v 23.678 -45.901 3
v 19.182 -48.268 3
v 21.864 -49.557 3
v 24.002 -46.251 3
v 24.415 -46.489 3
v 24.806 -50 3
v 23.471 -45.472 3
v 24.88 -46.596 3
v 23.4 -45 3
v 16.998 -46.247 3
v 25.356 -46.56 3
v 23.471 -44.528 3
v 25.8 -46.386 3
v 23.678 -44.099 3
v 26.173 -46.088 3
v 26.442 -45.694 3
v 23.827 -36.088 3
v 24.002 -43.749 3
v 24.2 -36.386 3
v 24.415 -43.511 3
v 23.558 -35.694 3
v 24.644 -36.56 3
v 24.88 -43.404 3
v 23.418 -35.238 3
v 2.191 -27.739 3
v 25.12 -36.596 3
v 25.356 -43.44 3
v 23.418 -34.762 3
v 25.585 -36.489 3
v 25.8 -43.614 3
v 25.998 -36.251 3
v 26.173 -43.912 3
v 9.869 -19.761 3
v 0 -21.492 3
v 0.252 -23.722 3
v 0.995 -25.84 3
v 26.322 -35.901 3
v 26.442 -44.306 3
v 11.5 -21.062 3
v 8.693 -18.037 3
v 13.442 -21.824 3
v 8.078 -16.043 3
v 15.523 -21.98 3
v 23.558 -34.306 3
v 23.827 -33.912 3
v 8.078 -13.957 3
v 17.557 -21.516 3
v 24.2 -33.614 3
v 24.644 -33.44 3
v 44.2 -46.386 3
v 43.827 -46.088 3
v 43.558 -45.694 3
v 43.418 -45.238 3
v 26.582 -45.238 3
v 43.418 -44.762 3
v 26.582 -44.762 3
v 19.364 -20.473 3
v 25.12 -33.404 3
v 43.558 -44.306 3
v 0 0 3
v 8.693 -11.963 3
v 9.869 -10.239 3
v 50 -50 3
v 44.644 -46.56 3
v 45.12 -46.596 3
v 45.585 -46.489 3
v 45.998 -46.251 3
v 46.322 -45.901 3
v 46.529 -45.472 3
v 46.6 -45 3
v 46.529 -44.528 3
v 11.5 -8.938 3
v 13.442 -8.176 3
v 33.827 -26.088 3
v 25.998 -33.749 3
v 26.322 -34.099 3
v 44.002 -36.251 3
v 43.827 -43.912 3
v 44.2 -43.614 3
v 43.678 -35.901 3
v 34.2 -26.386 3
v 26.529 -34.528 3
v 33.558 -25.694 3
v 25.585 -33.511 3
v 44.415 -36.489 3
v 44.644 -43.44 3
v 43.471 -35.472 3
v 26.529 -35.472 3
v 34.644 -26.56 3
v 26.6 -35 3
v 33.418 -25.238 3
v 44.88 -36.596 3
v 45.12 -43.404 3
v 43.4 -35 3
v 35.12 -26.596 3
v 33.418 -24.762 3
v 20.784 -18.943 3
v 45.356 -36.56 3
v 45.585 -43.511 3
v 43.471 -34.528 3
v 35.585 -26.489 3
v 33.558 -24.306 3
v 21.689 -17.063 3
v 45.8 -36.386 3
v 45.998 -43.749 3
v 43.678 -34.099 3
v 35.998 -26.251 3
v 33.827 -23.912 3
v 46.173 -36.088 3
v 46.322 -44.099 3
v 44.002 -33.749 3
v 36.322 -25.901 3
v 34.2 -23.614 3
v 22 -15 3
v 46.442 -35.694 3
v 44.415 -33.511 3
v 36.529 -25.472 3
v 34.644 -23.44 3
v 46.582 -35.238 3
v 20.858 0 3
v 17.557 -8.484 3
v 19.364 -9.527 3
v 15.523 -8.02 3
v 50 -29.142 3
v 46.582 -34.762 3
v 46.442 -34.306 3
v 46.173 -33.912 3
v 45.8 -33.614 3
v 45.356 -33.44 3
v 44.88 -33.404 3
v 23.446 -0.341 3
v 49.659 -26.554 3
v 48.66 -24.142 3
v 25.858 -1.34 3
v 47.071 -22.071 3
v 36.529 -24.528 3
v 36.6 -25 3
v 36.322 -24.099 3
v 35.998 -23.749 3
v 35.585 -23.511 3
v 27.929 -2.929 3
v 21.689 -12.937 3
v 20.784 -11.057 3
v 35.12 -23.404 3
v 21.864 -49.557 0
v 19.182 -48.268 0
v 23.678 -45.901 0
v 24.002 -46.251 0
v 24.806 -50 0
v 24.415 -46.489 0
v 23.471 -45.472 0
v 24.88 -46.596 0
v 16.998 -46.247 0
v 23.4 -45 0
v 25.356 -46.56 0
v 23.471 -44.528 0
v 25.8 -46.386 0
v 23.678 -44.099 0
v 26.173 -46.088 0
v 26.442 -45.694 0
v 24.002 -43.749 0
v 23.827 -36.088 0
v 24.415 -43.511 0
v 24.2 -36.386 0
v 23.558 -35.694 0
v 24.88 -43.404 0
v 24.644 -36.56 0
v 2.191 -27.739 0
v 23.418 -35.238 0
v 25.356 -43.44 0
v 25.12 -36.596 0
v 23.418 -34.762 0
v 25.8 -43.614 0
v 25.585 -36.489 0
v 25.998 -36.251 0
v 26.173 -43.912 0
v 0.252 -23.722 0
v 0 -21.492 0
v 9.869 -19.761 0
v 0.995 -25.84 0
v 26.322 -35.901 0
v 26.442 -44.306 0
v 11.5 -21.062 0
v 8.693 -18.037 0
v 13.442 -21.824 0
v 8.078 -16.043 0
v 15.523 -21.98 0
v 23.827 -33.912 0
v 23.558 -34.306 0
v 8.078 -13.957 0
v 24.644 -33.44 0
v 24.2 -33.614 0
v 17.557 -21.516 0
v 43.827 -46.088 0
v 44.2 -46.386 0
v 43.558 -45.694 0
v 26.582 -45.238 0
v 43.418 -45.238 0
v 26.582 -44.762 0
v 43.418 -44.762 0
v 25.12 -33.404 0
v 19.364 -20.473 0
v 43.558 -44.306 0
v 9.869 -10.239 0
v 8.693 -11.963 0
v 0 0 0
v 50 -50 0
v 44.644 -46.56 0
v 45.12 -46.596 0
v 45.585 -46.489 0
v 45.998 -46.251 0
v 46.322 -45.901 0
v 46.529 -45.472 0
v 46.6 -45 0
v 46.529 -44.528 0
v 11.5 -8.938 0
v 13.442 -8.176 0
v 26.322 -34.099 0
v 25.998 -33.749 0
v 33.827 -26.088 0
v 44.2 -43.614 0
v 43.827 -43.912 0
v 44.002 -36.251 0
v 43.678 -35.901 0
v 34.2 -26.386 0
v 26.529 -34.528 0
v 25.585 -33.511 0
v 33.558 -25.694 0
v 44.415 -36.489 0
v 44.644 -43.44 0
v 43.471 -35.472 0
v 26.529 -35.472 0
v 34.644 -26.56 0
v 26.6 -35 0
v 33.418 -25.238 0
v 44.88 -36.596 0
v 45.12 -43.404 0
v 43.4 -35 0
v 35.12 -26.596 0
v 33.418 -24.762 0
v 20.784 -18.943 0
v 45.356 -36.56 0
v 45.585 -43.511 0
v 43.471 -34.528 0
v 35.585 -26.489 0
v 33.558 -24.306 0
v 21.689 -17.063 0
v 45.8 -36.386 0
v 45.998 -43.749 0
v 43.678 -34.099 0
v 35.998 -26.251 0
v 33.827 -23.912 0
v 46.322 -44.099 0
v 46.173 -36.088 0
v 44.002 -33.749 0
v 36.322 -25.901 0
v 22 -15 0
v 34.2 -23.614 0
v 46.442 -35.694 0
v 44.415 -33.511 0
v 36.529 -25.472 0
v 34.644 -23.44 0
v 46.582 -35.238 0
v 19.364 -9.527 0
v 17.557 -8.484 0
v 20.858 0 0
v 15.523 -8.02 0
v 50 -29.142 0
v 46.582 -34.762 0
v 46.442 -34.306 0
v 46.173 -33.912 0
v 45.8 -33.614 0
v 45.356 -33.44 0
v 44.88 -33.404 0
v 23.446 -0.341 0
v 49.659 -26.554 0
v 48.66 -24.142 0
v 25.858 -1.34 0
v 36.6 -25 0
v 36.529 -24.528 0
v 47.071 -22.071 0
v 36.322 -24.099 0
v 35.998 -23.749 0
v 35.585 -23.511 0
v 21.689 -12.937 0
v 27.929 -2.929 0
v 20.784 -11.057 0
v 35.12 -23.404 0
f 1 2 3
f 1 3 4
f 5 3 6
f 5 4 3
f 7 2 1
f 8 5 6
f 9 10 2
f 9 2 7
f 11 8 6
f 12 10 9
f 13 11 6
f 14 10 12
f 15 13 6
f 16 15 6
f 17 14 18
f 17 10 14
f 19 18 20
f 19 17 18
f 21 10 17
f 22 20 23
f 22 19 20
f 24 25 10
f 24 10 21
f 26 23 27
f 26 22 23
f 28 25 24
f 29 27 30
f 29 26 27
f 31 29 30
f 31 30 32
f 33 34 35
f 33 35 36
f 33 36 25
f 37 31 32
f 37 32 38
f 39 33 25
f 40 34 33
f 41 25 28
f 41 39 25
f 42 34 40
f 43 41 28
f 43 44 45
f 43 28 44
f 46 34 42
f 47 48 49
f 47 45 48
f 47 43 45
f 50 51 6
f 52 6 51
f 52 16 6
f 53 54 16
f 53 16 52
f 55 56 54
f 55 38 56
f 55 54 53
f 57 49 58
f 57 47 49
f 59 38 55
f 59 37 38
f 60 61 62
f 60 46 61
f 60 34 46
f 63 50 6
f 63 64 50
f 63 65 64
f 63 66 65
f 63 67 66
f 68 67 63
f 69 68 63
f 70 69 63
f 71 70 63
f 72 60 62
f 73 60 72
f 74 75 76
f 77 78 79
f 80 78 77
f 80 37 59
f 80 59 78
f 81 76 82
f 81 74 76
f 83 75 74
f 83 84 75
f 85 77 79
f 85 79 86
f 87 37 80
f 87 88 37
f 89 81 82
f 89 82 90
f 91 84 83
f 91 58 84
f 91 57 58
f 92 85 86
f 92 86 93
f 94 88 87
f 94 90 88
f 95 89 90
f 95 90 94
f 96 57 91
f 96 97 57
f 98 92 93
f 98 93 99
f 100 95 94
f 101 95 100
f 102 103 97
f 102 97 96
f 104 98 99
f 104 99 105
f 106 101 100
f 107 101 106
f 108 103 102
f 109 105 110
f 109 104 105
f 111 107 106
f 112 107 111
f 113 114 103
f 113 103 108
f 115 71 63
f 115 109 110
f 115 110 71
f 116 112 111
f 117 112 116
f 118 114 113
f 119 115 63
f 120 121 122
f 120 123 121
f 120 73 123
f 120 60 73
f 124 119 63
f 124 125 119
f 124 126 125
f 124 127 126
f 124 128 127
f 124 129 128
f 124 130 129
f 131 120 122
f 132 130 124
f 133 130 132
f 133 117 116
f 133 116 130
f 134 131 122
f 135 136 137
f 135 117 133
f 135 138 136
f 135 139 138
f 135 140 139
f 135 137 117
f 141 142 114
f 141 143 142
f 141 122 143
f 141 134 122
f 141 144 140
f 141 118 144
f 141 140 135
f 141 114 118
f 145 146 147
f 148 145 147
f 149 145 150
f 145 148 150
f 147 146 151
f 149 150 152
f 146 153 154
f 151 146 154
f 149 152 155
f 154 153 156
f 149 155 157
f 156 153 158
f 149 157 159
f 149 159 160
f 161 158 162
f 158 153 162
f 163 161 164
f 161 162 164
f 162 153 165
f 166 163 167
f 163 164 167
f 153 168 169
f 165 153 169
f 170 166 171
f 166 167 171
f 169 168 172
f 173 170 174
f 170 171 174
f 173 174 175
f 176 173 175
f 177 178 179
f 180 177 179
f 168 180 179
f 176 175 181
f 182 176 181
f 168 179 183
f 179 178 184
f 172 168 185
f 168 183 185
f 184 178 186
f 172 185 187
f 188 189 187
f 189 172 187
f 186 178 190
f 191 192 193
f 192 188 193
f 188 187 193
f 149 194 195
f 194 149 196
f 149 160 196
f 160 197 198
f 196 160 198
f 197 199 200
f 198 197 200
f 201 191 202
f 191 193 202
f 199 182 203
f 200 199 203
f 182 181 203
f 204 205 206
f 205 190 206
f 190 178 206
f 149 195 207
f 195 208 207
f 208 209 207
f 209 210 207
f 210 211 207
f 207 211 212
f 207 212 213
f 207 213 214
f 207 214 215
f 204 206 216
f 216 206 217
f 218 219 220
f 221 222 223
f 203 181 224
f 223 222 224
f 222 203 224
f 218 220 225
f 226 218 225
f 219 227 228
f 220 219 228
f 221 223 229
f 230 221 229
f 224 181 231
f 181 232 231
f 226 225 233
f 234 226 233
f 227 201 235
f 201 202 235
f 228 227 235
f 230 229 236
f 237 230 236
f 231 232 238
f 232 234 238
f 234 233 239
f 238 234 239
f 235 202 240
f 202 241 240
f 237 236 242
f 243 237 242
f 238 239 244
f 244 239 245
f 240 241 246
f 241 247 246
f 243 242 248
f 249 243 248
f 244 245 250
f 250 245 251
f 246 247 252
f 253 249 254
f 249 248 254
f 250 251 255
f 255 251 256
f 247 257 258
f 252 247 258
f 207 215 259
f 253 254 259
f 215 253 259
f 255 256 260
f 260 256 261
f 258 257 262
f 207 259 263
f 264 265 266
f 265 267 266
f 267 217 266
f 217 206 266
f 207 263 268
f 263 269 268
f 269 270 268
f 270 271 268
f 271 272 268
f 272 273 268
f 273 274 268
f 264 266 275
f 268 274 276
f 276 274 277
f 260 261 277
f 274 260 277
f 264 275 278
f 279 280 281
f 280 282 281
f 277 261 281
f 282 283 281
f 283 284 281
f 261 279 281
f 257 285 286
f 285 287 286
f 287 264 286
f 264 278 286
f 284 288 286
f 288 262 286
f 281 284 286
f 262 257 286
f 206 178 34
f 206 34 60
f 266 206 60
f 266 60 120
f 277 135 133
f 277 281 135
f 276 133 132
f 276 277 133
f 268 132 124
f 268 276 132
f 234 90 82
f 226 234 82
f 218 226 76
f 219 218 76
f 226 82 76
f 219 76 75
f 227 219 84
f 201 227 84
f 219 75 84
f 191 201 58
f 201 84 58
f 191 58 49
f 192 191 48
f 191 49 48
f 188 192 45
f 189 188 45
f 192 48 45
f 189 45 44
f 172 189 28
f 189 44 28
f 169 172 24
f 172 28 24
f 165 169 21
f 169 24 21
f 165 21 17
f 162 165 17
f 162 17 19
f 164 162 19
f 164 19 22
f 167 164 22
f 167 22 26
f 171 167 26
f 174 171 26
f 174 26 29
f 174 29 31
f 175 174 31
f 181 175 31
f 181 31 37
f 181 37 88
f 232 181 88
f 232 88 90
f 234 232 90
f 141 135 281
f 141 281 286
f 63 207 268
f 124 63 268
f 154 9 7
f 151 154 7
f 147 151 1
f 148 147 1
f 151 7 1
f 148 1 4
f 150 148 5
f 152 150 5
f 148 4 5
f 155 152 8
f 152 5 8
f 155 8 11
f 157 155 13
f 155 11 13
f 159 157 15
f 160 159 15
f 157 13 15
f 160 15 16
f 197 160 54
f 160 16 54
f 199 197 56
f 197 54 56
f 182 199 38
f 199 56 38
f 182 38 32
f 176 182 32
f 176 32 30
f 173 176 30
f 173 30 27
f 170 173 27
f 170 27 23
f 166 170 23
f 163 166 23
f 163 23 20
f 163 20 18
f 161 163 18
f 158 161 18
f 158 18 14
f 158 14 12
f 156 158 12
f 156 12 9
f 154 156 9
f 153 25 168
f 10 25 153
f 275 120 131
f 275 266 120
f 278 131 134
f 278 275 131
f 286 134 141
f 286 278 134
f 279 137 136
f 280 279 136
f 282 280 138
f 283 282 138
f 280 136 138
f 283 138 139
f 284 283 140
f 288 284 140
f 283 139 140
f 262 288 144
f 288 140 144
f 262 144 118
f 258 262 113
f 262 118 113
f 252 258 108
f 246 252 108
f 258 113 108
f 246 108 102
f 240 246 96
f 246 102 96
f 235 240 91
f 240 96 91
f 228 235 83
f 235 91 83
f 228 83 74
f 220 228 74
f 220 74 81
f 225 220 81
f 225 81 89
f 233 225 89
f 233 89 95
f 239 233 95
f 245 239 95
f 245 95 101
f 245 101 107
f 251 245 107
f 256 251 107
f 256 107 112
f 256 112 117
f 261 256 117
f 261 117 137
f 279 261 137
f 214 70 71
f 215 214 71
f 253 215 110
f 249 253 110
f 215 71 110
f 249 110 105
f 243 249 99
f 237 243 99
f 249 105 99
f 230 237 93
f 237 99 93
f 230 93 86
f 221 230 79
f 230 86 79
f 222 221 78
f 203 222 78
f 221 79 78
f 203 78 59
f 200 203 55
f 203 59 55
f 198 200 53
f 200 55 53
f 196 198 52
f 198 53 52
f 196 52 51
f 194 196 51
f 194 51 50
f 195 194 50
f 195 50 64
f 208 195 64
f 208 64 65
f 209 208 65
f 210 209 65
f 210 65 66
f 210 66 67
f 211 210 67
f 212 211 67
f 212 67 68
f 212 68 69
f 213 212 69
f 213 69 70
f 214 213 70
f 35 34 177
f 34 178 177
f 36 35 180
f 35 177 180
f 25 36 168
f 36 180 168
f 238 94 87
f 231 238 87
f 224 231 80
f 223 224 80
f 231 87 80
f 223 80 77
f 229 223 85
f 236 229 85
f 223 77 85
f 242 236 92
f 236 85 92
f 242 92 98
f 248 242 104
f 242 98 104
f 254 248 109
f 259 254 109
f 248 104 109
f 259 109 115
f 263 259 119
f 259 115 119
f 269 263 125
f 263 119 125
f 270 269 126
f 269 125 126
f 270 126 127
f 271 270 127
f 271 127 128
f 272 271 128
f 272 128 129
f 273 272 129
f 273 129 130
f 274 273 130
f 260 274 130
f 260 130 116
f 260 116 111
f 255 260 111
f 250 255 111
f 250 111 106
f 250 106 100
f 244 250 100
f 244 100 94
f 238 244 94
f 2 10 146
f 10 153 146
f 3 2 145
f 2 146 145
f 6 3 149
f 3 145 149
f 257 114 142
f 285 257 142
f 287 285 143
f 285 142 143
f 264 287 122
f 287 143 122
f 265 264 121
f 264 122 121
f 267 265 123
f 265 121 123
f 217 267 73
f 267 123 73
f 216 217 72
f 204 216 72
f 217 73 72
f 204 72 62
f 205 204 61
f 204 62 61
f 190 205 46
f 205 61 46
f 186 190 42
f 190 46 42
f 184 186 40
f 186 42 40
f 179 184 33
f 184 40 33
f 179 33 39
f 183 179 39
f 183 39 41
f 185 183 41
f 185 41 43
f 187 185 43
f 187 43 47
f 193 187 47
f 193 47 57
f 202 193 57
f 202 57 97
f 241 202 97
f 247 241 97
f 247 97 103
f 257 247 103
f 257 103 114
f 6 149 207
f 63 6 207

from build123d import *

# Parameters (mm, degrees)
SKETCH_1_W          = 50
SKETCH_1_H          = 50
EXTRUDE_1_DEPTH     = 3
SKETCH_2_R          = 7
SKETCH_2_R_2        = 1.6
CUT_EXTRUDE_1_DEPTH = 71.774289117
CUT_EXTRUDE_2_DEPTH = 71.774289117
FILLET_1_R          = 10


with BuildPart() as part:
    # 草图1 → 凸台-拉伸1 (new body)
    with BuildSketch(Plane.XY):
        with Locations((25, -25)):
            Rectangle(SKETCH_1_W, SKETCH_1_H)
    extrude(amount=EXTRUDE_1_DEPTH)

    # 草图2 → 切除-拉伸1 (cut, through all)
    with BuildSketch(Plane.XY.offset(3)):
        with Locations((15, -15)):
            Circle(SKETCH_2_R)
        with Locations((45, -45)):
            Circle(SKETCH_2_R_2)
        with Locations(Location((45, -35, 0), (0, 0, 180))):
            Circle(SKETCH_2_R_2)
        with Locations((25, -35)):
            Circle(SKETCH_2_R_2)
        with Locations(Location((25, -45, 0), (0, 0, 180))):
            Circle(SKETCH_2_R_2)
        with Locations((35, -25)):
            Circle(SKETCH_2_R_2)
    extrude(amount=-CUT_EXTRUDE_1_DEPTH, mode=Mode.SUBTRACT)

    # 草图3 → 切除-拉伸2 (cut, through all)
    with BuildSketch(Plane.XY.offset(3)):
        Polygon((0, -25), (20, -50), (0, -50), align=None)
        Polygon((25, 0), (50, 0), (50, -25), align=None)
    extrude(amount=-CUT_EXTRUDE_2_DEPTH, mode=Mode.SUBTRACT)

    # 圆角1
    fillet_1_edges = [part.edges().sort_by_distance(p)[0] for p in [
        (0, -25, 1.5),
        (20, -50, 1.5),
        (50, -25, 1.5),
        (25, 0, 1.5),
    ]]
    fillet(fillet_1_edges, radius=FILLET_1_R)


solid = part.part
